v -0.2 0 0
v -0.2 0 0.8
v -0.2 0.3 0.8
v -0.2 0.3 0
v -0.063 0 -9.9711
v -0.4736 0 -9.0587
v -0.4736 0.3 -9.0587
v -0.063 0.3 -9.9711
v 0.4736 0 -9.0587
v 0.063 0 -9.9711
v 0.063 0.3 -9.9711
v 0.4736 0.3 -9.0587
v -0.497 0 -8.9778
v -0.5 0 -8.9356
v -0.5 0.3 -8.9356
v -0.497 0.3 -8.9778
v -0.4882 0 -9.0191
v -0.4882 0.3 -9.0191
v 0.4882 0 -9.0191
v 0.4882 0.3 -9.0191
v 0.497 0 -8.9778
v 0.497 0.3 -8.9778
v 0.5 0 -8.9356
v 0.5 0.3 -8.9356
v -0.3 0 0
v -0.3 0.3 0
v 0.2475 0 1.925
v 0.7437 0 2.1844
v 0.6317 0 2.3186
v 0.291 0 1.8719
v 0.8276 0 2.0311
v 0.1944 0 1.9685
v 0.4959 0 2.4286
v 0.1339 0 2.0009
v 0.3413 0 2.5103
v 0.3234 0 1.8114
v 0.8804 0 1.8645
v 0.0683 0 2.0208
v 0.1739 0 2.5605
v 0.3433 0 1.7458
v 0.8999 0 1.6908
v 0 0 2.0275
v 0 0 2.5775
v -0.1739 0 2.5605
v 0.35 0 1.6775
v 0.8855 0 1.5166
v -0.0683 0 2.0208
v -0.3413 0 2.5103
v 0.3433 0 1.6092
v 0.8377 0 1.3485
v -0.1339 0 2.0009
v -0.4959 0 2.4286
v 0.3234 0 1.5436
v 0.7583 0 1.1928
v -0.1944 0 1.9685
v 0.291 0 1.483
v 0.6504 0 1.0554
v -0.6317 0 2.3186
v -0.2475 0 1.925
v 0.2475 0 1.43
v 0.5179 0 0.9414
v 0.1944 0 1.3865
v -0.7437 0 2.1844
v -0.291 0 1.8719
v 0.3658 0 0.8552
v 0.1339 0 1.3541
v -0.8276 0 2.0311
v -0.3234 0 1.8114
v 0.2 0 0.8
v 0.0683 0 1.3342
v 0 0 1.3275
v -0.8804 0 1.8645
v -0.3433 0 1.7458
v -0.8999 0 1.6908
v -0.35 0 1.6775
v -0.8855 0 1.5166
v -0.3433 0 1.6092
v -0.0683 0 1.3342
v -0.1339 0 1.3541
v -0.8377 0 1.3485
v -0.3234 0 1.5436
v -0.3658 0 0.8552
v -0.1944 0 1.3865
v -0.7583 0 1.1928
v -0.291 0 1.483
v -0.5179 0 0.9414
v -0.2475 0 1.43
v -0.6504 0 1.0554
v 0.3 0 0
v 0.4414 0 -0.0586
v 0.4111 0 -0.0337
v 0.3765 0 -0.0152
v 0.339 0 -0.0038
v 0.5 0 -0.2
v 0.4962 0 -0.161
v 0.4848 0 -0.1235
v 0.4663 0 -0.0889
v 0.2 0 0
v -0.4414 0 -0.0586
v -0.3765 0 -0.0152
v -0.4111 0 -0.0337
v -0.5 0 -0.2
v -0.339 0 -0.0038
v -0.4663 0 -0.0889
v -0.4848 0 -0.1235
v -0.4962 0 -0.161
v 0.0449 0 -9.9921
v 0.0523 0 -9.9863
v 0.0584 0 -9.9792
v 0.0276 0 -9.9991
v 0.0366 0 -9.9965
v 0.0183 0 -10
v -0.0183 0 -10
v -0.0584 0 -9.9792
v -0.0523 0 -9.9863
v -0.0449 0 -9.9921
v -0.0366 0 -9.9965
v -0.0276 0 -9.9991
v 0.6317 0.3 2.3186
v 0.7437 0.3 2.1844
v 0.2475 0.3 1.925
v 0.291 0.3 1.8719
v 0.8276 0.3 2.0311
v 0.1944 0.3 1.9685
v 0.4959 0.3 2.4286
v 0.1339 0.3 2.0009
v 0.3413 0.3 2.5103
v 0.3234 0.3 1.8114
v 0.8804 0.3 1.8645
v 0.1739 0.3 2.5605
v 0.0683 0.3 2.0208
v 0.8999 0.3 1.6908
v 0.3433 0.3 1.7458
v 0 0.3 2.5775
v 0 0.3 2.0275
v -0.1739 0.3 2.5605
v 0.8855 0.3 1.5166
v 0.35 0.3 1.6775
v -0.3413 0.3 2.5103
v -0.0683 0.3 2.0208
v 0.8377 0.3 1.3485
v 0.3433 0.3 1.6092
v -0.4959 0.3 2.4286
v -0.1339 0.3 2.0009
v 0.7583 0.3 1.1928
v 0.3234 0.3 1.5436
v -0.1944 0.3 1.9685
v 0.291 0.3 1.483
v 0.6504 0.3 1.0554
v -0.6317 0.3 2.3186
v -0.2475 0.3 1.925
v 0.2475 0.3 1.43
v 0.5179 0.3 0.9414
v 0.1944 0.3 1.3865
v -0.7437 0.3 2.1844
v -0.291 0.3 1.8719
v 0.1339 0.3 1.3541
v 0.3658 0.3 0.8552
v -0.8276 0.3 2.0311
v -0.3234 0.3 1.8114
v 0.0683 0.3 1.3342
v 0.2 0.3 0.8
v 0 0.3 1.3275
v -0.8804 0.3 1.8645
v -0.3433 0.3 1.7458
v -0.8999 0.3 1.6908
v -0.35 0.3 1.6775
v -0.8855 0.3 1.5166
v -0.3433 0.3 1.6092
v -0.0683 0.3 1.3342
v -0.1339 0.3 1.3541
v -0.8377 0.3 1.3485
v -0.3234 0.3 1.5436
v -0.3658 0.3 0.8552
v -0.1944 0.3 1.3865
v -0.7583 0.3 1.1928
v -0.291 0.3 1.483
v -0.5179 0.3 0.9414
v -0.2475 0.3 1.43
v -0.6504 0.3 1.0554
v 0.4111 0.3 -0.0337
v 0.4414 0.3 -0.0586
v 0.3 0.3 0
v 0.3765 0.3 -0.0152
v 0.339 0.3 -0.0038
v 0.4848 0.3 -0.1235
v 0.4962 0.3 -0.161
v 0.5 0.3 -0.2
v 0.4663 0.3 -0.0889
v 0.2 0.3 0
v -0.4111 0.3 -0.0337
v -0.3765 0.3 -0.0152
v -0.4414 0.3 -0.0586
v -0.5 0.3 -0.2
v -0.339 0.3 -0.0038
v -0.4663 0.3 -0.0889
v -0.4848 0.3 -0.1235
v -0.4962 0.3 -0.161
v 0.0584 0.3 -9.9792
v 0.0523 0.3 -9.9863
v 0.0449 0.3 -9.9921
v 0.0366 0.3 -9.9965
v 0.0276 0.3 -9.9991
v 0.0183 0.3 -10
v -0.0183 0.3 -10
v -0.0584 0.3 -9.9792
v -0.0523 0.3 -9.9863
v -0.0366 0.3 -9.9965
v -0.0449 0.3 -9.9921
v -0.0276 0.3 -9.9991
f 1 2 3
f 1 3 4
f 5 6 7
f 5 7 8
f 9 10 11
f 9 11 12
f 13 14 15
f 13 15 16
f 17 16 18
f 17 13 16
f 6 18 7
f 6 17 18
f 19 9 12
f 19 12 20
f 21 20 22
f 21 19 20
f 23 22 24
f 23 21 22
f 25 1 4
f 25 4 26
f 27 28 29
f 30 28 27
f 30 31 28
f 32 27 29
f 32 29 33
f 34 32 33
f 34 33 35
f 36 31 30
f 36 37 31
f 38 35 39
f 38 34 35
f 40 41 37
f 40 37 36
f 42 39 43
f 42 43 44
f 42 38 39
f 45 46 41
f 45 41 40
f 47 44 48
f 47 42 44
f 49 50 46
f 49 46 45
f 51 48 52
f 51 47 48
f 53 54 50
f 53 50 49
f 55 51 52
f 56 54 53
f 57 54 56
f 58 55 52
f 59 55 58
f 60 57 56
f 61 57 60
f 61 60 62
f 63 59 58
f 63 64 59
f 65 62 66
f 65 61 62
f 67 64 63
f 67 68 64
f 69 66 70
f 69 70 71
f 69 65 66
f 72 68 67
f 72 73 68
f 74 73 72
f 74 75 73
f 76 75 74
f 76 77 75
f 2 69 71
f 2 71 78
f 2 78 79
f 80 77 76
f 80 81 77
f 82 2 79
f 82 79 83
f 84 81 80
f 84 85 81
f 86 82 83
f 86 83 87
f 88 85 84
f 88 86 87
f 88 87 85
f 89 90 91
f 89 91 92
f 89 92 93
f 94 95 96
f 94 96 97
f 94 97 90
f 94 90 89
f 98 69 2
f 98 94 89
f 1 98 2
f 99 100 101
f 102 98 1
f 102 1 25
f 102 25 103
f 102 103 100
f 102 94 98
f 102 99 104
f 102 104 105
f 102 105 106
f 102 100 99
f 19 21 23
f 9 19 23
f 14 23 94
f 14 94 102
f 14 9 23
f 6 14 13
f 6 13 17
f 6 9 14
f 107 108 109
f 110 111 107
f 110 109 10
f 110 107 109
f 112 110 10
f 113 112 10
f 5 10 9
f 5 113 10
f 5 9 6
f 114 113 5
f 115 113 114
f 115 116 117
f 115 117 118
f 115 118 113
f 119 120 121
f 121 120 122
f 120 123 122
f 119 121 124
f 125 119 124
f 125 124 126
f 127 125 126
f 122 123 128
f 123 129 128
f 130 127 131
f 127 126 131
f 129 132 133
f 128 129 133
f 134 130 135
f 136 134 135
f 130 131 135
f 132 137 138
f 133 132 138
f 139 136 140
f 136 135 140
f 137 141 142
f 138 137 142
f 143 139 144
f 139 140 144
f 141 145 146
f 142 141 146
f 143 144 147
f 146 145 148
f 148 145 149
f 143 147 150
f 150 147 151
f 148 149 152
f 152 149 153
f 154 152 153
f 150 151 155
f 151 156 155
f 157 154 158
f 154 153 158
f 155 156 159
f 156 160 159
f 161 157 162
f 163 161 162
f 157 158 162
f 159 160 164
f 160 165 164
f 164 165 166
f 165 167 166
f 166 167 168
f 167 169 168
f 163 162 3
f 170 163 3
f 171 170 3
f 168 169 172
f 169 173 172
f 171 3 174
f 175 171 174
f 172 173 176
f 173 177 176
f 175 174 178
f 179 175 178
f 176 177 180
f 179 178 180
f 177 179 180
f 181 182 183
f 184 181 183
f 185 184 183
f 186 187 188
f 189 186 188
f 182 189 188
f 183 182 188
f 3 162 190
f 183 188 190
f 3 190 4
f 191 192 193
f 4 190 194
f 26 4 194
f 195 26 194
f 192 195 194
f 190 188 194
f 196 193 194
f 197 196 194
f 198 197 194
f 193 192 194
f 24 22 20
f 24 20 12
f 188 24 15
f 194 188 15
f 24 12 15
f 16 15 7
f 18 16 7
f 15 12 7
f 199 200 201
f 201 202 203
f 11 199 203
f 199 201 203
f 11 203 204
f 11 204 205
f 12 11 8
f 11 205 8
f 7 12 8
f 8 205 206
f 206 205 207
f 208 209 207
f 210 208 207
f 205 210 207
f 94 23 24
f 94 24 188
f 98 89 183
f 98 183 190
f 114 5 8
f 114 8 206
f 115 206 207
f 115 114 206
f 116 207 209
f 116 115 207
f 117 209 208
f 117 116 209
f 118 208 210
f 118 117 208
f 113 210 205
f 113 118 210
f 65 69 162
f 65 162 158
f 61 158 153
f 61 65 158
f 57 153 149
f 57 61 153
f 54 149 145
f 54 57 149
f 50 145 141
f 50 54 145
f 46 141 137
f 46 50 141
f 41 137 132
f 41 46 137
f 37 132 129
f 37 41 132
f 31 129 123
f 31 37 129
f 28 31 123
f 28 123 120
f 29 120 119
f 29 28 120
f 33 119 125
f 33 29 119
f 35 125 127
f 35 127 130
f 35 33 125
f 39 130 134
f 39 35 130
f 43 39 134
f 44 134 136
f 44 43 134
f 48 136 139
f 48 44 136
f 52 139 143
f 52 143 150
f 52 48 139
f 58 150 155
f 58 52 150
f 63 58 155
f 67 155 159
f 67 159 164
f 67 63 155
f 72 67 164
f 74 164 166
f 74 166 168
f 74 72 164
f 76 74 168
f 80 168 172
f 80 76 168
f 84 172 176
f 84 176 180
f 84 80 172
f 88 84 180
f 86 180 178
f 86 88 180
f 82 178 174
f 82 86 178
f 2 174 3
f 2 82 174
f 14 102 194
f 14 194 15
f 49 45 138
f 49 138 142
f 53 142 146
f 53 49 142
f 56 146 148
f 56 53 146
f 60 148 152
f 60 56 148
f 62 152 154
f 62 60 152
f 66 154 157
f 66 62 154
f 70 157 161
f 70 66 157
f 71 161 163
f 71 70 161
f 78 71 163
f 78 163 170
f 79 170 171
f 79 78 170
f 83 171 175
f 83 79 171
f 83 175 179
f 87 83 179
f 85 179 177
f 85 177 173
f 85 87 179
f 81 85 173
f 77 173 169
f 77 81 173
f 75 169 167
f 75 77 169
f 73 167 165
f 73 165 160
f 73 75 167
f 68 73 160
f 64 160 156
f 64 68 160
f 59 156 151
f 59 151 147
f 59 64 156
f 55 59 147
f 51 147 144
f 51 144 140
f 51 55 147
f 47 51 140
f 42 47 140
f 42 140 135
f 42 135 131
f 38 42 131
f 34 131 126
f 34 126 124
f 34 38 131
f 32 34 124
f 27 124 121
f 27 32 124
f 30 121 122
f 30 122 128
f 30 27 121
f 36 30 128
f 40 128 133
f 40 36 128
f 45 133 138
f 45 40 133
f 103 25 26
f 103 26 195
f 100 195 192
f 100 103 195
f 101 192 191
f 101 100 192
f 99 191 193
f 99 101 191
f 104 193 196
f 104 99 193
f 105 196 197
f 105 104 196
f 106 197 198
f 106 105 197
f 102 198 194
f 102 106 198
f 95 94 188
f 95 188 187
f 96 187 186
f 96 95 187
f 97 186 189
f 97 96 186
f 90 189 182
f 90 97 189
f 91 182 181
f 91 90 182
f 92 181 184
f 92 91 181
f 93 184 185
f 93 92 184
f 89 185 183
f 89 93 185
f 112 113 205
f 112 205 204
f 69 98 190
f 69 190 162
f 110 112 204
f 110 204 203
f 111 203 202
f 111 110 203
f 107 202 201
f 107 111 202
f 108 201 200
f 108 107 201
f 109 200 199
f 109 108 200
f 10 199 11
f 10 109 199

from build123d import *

# Parameters (mm, degrees)
SKETCH1_R           = 0.35
BOSS_EXTRUDE1_DEPTH = 0.3


with BuildPart() as part:
    # Sketch1 → Boss-Extrude1 (new body)
    with BuildSketch(Plane(origin=(0, 0, 0), x_dir=(1, 0, 0), z_dir=(0, 1, 0))):
        with BuildLine():
            Line((0.063001459, 9.971107869), (0.473576452, 9.058718997))
            ThreePointArc((0.473576452, 9.058718997), (0.493319736, 8.998566184), (0.5, 8.935609593))
            Line((0.5, 8.935609593), (0.5, 0.2))
            ThreePointArc((0.5, 0.2), (0.441421356, 0.058578644), (0.3, 0))
            Line((0.3, 0), (0.2, 0))
            Line((0.2, 0), (0.2, -0.8))
            ThreePointArc((0.2, -0.8), (0, -2.577496439), (-0.2, -0.8))
            Line((-0.2, -0.8), (-0.2, 0))
            Line((-0.2, 0), (-0.3, 0))
            ThreePointArc((-0.3, 0), (-0.441421356, 0.058578644), (-0.5, 0.2))
            Line((-0.5, 0.2), (-0.5, 8.935609593))
            ThreePointArc((-0.5, 8.935609593), (-0.493319736, 8.998566184), (-0.473576452, 9.058718997))
            Line((-0.473576452, 9.058718997), (-0.063001459, 9.971107869))
            ThreePointArc((-0.063001459, 9.971107869), (-0.044922891, 9.992147816), (-0.018317305, 10))
            Line((-0.018317305, 10), (0.018317305, 10))
            ThreePointArc((0.018317305, 10), (0.044922891, 9.992147816), (0.063001459, 9.971107869))
        make_face()
        with Locations((0, -1.677496439)):
            Circle(SKETCH1_R, mode=Mode.SUBTRACT)
    extrude(amount=BOSS_EXTRUDE1_DEPTH)


solid = part.part
